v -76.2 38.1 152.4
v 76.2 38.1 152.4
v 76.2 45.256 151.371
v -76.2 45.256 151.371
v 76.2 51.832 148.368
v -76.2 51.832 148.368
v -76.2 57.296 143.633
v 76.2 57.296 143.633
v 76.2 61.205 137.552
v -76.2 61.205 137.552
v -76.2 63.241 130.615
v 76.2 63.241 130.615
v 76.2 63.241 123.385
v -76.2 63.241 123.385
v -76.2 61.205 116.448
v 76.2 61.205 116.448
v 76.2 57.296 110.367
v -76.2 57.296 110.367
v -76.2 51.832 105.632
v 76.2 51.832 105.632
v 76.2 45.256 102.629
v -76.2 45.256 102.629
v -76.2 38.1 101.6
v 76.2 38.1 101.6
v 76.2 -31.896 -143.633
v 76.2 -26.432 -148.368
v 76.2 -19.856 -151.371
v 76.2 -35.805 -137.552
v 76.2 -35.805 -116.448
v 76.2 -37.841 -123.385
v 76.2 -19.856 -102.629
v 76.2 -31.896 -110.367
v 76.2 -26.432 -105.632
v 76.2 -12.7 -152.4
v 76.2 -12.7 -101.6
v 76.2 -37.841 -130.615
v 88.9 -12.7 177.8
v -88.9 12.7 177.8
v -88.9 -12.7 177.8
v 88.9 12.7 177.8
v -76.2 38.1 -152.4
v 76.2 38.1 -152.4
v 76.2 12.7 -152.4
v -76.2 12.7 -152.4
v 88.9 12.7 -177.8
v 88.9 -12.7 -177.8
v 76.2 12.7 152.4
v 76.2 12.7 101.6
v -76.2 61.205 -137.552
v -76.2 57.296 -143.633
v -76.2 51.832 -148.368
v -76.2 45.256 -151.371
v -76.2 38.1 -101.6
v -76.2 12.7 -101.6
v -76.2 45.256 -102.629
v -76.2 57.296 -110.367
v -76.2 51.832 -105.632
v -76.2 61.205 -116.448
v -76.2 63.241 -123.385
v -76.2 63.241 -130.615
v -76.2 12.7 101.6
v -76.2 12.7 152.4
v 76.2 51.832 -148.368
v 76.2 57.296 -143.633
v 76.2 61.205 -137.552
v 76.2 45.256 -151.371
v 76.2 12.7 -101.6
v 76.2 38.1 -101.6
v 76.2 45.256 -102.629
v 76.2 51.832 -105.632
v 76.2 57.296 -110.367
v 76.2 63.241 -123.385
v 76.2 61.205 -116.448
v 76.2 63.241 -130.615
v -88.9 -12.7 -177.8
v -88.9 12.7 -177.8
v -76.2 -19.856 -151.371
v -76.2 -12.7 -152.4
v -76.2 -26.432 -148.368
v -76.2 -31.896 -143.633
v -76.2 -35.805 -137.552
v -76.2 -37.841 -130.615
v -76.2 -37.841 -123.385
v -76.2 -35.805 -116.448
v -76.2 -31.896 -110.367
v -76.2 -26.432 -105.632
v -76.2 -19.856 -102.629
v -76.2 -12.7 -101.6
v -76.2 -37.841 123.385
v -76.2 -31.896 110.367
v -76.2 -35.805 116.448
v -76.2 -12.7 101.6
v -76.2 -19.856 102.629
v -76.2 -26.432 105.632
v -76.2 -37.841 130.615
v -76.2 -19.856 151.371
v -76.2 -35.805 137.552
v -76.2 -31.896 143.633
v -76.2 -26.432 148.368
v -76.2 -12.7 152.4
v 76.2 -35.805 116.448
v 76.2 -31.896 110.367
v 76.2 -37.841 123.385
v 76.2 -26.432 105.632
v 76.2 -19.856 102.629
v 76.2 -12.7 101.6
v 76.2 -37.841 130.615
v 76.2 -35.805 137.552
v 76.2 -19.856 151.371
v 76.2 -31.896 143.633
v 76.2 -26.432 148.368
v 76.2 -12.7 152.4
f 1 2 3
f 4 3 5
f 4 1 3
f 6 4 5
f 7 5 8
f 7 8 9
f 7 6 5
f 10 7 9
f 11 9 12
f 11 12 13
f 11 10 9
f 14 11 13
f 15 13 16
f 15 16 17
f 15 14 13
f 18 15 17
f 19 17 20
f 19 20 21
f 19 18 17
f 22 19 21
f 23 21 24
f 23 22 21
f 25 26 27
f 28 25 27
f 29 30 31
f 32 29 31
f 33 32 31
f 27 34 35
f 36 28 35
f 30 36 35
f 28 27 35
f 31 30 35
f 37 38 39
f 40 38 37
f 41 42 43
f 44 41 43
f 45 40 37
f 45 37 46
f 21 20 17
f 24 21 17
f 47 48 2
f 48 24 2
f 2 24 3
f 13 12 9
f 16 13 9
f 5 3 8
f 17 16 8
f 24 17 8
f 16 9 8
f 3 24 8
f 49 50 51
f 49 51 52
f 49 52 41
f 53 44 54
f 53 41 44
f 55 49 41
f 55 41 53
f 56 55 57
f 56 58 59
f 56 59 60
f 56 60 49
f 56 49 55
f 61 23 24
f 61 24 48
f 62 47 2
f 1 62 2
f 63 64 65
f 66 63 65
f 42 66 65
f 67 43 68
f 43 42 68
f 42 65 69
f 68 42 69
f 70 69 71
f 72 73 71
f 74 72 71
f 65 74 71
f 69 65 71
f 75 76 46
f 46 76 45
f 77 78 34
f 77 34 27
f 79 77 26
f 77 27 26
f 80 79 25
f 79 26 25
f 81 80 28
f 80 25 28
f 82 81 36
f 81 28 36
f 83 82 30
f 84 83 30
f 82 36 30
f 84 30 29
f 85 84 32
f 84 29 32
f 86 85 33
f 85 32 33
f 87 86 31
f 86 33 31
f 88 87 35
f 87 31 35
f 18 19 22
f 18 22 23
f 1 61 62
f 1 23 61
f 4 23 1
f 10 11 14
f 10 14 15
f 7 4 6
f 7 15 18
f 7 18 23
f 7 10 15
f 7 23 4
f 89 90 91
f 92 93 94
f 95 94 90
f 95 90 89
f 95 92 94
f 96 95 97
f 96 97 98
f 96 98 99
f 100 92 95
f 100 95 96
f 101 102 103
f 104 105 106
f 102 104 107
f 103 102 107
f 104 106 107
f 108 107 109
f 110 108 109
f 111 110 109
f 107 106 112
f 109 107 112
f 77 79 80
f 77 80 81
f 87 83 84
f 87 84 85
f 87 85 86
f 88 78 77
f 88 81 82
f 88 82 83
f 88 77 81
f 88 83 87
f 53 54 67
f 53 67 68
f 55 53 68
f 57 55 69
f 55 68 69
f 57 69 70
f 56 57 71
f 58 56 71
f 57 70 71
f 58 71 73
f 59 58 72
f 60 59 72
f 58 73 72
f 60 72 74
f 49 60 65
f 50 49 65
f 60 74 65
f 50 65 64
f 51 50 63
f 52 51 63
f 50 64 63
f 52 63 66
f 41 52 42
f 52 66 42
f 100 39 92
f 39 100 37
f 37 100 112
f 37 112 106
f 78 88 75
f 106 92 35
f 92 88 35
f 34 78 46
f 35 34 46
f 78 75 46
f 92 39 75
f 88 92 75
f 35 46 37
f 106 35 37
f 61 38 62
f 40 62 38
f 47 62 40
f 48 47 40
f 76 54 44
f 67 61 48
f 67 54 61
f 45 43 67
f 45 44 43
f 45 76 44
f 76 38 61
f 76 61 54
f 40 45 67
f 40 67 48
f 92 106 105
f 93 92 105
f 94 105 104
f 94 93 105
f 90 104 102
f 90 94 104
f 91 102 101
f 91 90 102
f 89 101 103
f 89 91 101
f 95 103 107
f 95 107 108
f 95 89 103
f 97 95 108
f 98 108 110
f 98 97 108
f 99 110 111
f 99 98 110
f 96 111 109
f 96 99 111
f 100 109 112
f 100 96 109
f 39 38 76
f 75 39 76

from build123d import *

# Parameters (mm, degrees)
SKETCH1_W           = 177.8
SKETCH1_H           = 355.6
BOSS_EXTRUDE1_DEPTH = 12.7
BOSS_EXTRUDE2_DEPTH = 76.2


with BuildPart() as part:
    # Sketch1 → Boss-Extrude1 (new, symmetric)
    with BuildSketch(Plane(origin=(0, 0, 0), x_dir=(1, 0, 0), z_dir=(0, 1, 0))):
        Rectangle(SKETCH1_W, SKETCH1_H)
    extrude(amount=BOSS_EXTRUDE1_DEPTH, both=True)

    # Sketch2 → Boss-Extrude2 (add, symmetric)
    with BuildSketch(Plane(origin=(0, 0, 0), x_dir=(0, 0, -1), z_dir=(1, 0, 0))):
        with BuildLine():
            Line((-152.4, -12.7), (-152.4, 38.1))
            ThreePointArc((-152.4, 38.1), (-127, 63.5), (-101.6, 38.1))
            Line((-101.6, 38.1), (-101.6, -12.7))
            ThreePointArc((-101.6, -12.7), (-127, -38.1), (-152.4, -12.7))
        make_face()
        with BuildLine():
            Line((101.6, -12.7), (101.6, 38.1))
            ThreePointArc((101.6, 38.1), (127, 63.5), (152.4, 38.1))
            Line((152.4, 38.1), (152.4, -12.7))
            ThreePointArc((152.4, -12.7), (127, -38.1), (101.6, -12.7))
        make_face()
    extrude(amount=BOSS_EXTRUDE2_DEPTH, both=True)


solid = part.part
